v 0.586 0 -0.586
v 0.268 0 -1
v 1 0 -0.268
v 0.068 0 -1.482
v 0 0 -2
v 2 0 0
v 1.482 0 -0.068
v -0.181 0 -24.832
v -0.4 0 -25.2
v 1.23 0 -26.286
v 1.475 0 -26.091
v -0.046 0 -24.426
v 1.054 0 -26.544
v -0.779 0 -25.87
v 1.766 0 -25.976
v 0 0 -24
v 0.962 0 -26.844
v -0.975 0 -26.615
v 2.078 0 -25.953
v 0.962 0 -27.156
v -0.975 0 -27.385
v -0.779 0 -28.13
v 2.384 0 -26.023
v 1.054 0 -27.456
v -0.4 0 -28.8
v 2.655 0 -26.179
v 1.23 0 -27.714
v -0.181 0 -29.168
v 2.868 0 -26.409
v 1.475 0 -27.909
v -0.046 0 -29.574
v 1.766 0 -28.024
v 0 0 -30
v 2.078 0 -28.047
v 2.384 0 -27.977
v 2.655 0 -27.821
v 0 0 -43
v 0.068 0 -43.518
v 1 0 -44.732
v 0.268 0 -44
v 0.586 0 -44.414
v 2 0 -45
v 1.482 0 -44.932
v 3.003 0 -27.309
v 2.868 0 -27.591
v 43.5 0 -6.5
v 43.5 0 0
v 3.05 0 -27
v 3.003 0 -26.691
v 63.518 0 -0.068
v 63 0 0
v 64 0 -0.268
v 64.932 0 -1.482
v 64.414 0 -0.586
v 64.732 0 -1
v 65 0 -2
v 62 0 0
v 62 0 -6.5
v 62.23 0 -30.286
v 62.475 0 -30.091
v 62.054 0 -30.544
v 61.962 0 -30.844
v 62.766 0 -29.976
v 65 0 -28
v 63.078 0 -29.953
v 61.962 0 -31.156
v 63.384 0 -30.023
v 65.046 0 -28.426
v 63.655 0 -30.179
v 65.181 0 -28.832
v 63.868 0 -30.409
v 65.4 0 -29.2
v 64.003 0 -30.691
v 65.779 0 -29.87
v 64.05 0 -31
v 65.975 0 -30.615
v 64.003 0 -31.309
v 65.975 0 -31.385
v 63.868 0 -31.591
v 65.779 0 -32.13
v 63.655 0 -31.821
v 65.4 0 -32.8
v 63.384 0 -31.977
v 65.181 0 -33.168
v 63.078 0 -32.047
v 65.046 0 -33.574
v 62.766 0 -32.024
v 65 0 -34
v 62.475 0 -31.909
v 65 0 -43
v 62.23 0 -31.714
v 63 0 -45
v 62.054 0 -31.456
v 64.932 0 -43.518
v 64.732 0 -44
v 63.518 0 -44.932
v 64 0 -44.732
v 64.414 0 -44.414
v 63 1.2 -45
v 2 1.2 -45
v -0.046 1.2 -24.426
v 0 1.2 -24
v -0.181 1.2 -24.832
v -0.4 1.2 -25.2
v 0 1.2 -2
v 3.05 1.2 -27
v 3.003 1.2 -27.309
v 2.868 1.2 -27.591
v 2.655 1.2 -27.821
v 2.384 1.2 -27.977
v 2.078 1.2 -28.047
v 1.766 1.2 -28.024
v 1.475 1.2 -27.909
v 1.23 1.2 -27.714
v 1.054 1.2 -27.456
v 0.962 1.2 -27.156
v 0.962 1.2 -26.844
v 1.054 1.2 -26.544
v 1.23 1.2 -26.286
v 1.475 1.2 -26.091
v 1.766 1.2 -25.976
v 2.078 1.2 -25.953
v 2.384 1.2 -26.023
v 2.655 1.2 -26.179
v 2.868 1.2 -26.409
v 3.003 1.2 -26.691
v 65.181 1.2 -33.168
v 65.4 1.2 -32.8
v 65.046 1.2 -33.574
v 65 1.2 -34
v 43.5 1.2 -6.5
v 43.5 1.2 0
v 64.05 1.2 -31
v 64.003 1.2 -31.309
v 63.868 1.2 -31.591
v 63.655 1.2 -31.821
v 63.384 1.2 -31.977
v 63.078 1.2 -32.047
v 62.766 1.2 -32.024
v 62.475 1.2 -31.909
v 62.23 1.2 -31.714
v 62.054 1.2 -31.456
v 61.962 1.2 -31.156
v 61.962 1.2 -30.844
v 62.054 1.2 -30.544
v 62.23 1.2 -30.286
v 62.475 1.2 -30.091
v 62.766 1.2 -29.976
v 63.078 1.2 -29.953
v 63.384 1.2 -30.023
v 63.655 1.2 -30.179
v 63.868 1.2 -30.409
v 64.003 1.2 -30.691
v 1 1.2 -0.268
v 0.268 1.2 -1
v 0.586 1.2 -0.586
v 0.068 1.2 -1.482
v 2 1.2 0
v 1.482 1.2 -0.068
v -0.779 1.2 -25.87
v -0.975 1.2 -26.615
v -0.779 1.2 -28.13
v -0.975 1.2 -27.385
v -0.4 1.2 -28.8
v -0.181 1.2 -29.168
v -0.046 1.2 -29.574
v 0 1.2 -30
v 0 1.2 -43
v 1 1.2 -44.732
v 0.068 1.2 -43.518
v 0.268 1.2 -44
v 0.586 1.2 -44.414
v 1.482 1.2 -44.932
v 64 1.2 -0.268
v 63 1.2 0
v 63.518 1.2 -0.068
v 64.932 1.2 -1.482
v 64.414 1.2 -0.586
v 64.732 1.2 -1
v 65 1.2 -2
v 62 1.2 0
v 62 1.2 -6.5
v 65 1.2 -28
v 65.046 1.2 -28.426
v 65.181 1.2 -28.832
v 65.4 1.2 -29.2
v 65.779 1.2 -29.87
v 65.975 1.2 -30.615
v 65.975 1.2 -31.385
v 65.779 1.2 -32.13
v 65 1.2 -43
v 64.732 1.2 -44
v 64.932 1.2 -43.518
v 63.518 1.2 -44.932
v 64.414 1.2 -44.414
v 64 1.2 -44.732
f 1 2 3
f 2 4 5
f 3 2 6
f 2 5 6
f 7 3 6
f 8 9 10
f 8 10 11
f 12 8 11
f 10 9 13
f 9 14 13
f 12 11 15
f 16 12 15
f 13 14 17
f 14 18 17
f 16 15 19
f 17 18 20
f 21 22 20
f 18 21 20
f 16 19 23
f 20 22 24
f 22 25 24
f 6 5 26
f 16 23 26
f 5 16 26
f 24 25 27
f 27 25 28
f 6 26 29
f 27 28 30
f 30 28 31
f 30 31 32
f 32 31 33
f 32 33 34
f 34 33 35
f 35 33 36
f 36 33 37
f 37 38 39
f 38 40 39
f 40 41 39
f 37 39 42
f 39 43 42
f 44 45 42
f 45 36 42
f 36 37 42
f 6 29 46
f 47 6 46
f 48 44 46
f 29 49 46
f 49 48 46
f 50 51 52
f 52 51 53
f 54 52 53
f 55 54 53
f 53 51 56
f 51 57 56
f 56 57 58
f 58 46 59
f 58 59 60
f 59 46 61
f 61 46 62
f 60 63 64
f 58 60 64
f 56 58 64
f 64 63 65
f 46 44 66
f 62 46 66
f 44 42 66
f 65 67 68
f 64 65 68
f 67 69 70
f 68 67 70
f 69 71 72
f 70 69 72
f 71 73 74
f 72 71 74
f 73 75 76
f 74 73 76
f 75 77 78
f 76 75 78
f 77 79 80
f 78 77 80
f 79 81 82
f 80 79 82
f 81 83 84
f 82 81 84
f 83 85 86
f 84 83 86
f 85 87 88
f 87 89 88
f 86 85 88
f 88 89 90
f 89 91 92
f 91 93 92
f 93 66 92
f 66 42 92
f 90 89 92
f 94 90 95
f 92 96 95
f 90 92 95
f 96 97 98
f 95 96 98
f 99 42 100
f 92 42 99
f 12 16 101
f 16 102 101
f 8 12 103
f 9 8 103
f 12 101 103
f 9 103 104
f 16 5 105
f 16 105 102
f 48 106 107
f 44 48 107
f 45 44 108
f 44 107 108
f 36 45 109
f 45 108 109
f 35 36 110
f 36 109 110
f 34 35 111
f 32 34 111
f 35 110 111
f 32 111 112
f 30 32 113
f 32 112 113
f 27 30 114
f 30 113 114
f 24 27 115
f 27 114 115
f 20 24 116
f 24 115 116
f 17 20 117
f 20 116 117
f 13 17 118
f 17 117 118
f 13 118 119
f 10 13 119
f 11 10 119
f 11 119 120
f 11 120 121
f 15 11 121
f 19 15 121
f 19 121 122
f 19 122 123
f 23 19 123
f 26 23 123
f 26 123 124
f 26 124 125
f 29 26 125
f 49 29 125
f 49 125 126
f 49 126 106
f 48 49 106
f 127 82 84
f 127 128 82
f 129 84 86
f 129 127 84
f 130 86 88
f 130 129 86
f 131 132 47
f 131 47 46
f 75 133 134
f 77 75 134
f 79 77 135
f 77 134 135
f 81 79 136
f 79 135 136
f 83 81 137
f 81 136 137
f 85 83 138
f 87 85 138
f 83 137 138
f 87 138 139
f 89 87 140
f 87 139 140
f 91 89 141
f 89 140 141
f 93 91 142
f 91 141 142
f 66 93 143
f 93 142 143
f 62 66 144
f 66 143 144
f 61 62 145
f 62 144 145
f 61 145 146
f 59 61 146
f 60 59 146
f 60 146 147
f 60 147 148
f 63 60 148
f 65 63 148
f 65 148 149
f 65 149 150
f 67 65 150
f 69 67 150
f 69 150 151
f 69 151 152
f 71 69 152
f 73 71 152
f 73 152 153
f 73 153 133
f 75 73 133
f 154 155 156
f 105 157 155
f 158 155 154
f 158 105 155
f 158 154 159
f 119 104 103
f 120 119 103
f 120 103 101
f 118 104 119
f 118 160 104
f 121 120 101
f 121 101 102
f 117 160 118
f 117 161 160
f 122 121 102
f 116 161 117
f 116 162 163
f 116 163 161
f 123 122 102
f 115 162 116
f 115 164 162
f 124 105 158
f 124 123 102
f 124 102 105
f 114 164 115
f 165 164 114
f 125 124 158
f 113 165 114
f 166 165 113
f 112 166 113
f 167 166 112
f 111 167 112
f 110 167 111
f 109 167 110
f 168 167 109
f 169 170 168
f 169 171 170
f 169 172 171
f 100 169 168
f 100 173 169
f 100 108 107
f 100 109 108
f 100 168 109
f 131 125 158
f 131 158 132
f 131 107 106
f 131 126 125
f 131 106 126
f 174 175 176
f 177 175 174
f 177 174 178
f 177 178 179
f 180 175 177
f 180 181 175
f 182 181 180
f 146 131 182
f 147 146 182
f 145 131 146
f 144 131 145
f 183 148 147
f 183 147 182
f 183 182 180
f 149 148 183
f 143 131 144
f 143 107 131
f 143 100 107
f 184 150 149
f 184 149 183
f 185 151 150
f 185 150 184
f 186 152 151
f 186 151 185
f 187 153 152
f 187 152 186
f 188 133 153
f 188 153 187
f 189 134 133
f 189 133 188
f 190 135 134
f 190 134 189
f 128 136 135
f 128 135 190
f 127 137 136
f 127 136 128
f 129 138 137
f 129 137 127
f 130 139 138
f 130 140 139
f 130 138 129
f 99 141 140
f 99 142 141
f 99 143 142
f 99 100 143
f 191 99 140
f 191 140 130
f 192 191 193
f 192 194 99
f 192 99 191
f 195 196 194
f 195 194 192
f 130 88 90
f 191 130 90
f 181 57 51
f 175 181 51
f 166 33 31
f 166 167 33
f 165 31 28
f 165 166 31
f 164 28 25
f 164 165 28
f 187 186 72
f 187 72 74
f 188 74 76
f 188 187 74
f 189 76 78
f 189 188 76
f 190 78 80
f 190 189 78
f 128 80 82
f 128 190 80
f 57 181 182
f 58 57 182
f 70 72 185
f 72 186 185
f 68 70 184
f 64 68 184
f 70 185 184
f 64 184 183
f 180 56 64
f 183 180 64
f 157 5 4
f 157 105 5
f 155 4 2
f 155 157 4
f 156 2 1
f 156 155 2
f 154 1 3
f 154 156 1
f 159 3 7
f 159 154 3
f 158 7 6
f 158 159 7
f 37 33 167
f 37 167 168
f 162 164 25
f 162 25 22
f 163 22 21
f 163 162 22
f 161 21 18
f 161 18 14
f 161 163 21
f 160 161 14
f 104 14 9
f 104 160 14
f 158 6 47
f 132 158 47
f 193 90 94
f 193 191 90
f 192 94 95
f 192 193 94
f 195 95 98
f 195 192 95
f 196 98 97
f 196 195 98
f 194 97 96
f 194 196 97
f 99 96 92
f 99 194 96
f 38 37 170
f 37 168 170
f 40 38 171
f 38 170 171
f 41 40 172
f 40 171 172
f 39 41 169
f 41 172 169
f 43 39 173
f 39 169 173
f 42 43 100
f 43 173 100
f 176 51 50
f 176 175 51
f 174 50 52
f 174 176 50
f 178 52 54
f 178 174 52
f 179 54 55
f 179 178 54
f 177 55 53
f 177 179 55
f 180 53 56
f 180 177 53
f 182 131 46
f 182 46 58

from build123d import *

# Parameters (mm, degrees)
SKETCH_1_W          = 65
SKETCH_1_H          = 45
EXTRUDE_1_DEPTH     = 1.2
FILLET_1_R          = 2
SKETCH_2_5_R        = 3
EXTRUDE_2_DEPTH     = 1.2
SKETCH_2_R          = 1.05
CUT_EXTRUDE_1_DEPTH = 2.2
FILLET_2_R          = 2
SKETCH_3_W          = 18.5
SKETCH_3_H          = 6.5
CUT_EXTRUDE_2_DEPTH = 2.2


with BuildPart() as part:
    # 草图1 → 凸台-拉伸1 (new body)
    with BuildSketch(Plane(origin=(0, 0, 0), x_dir=(1, 0, 0), z_dir=(0, 1, 0))):
        with Locations((32.5, 22.5)):
            Rectangle(SKETCH_1_W, SKETCH_1_H)
    extrude(amount=EXTRUDE_1_DEPTH)

    # 圆角1
    fillet_1_edges = [part.edges().sort_by_distance(p)[0] for p in [
        (0, 0.6, -45),
        (65, 0.6, -45),
        (65, 0.6, 0),
        (0, 0.6, 0),
    ]]
    fillet(fillet_1_edges, radius=FILLET_1_R)

    # 草图2<5> → 凸台-拉伸2 (add)
    with BuildSketch(Plane(origin=(0, 1.2, 0), x_dir=(1, 0, 0), z_dir=(0, 1, 0))):
        with Locations((63, 31)):
            Circle(SKETCH_2_5_R)
        with Locations((2, 27)):
            Circle(SKETCH_2_5_R)
    extrude(amount=-EXTRUDE_2_DEPTH)

    # 草图2 → 切除-拉伸1 (cut, through all)
    with BuildSketch(Plane(origin=(0, 1.2, 0), x_dir=(1, 0, 0), z_dir=(0, 1, 0))):
        with Locations((63, 31)):
            Circle(SKETCH_2_R)
        with Locations((2, 27)):
            Circle(SKETCH_2_R)
    extrude(amount=-CUT_EXTRUDE_1_DEPTH, mode=Mode.SUBTRACT)

    # 圆角2
    fillet_2_edges = [part.edges().sort_by_distance(p)[0] for p in [
        (0, 0.6, -29.236067977),
        (0, 0.6, -24.763932023),
        (65, 0.6, -28.763932023),
        (65, 0.6, -33.236067977),
    ]]
    fillet(fillet_2_edges, radius=FILLET_2_R)

    # 草图3 → 切除-拉伸2 (cut, through all)
    with BuildSketch(Plane(origin=(0, 1.2, 0), x_dir=(1, 0, 0), z_dir=(0, 1, 0))):
        with Locations((52.75, 3.25)):
            Rectangle(SKETCH_3_W, SKETCH_3_H)
    extrude(amount=-CUT_EXTRUDE_2_DEPTH, mode=Mode.SUBTRACT)


solid = part.part
